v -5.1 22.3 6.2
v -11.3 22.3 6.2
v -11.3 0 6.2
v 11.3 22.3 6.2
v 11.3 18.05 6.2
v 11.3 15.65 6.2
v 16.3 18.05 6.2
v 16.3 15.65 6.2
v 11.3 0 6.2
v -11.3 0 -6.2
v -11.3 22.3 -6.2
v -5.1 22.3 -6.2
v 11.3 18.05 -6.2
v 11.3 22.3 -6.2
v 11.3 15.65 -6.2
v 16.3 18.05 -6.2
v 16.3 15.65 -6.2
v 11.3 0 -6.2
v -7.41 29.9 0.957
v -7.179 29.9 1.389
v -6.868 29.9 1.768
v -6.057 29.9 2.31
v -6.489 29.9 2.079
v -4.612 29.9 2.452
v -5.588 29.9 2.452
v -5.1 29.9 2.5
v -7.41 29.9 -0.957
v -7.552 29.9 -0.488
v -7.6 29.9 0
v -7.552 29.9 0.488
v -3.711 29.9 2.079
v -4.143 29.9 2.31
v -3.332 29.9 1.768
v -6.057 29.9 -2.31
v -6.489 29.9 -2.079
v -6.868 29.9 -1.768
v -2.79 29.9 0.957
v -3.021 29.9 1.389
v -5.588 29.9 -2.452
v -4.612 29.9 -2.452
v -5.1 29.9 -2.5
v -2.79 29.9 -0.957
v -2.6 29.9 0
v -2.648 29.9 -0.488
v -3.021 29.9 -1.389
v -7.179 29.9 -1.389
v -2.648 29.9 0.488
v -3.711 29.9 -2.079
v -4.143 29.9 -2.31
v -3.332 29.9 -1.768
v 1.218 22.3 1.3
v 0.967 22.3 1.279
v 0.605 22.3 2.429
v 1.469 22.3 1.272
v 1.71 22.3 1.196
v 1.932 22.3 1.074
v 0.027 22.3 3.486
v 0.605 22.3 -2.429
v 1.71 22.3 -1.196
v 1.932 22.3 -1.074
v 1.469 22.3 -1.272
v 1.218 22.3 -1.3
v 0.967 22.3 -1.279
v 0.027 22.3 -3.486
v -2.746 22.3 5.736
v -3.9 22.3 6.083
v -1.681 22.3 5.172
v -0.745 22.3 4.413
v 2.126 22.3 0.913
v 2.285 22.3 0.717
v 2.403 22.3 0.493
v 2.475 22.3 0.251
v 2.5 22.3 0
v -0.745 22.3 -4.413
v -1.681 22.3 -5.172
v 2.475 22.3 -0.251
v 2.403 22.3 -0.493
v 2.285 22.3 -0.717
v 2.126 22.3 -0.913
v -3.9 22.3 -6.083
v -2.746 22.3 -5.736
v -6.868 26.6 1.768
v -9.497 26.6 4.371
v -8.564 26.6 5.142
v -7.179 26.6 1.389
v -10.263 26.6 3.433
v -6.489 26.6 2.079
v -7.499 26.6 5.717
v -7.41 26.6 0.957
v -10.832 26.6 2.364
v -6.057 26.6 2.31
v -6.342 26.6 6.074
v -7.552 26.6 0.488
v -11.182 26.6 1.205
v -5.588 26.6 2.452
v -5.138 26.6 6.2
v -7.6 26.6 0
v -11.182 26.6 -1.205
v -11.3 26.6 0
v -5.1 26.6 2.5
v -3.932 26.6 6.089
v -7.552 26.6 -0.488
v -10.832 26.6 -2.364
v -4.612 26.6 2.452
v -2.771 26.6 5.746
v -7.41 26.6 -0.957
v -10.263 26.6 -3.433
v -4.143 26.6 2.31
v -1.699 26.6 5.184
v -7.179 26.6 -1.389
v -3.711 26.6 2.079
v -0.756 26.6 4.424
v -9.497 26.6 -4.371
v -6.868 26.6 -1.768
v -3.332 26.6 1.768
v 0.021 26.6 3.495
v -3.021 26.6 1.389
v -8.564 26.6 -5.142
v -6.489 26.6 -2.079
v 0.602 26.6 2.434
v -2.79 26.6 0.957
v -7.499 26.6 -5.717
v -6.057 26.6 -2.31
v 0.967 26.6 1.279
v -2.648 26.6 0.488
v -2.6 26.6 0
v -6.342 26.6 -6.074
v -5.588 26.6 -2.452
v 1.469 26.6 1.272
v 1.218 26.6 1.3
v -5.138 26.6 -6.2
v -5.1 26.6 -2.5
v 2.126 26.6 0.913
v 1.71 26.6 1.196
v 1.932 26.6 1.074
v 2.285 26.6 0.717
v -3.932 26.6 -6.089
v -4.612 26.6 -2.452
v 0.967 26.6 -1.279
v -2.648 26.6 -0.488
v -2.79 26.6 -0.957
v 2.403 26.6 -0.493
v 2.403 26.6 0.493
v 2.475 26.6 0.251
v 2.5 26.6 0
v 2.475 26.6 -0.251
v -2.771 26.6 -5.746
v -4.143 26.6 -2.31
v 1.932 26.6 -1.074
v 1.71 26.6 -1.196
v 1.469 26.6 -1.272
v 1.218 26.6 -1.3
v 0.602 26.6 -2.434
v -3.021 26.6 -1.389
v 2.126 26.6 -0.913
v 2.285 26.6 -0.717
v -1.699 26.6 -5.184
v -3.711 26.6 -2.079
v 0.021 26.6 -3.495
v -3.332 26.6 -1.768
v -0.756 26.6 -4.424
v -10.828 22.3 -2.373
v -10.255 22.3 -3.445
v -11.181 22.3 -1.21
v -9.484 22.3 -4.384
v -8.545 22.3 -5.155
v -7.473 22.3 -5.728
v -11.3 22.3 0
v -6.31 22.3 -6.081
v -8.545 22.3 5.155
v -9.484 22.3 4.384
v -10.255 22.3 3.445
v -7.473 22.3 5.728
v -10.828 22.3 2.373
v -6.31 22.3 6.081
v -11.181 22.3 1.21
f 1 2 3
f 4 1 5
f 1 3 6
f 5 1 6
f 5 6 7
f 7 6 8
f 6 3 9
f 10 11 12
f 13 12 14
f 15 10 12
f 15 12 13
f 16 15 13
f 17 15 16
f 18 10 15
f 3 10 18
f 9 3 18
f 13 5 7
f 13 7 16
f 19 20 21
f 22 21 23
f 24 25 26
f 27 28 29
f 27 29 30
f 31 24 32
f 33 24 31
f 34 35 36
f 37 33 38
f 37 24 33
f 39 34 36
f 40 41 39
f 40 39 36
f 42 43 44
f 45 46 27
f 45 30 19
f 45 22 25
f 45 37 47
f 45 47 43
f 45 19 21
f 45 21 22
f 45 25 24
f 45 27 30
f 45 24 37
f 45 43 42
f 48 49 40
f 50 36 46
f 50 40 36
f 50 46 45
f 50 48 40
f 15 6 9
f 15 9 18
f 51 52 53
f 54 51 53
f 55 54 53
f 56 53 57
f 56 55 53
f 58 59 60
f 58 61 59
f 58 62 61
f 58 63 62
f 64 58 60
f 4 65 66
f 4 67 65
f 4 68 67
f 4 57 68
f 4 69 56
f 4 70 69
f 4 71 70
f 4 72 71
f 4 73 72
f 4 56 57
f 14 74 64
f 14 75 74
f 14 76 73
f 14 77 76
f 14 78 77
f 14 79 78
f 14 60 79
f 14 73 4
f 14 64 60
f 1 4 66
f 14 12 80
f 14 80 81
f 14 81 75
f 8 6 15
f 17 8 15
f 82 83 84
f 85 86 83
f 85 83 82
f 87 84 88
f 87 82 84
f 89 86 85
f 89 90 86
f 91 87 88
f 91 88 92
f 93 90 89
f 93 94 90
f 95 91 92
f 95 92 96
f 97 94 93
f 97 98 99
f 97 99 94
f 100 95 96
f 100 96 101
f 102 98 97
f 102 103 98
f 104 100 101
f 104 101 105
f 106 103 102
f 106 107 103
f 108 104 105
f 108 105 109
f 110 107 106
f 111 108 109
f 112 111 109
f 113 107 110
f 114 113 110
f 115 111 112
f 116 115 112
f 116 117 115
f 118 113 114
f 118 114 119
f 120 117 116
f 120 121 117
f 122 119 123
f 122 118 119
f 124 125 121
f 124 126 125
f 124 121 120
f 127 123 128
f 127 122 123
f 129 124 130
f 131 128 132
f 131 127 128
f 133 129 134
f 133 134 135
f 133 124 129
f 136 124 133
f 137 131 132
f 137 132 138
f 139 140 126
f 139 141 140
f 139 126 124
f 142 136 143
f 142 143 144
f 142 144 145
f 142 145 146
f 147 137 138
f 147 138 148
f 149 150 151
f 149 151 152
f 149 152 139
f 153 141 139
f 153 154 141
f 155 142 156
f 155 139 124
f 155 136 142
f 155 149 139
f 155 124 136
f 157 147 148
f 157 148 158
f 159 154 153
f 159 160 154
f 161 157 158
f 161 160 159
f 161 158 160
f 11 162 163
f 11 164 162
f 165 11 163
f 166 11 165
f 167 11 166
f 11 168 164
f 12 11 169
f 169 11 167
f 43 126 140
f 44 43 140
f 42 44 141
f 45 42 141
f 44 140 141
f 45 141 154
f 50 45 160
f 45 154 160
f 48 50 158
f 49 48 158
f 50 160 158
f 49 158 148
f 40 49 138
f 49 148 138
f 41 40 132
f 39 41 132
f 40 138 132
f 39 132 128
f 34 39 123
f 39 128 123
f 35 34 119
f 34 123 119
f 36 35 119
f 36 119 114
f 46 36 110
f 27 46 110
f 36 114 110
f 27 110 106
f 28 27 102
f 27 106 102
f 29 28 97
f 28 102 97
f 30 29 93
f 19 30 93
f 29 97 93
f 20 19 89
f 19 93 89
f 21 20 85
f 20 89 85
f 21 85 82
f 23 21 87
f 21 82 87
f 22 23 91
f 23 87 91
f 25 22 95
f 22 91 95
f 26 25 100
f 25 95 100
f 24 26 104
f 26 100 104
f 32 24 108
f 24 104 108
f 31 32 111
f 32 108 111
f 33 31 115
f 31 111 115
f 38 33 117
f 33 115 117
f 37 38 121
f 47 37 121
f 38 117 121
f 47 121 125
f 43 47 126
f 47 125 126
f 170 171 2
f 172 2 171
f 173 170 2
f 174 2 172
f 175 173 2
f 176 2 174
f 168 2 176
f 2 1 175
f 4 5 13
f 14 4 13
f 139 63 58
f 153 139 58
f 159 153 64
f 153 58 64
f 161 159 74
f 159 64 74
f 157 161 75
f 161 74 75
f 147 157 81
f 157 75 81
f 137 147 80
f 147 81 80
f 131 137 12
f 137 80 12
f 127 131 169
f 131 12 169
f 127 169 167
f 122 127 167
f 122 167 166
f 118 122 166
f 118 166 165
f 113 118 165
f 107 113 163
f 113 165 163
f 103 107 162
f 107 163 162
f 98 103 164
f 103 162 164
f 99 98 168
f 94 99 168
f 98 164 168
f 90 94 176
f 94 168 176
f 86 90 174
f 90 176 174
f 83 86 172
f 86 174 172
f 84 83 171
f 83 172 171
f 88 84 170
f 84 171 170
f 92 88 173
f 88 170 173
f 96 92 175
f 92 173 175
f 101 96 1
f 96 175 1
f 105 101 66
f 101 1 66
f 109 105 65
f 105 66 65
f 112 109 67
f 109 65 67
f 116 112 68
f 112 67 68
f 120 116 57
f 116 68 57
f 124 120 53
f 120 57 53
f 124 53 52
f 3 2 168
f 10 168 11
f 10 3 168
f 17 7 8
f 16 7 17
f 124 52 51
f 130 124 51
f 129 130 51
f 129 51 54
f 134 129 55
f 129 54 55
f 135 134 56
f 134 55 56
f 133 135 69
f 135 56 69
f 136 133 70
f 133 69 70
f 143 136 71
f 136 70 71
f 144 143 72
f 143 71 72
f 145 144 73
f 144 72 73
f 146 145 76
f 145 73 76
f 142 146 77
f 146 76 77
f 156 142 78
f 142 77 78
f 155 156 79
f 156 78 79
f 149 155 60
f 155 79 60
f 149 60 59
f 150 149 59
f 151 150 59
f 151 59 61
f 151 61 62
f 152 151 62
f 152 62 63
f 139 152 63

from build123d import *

# Parameters (mm, degrees)
SKETCH1_W           = 22.6
SKETCH1_H           = 12.4
BOSS_EXTRUDE1_DEPTH = 22.3
SKETCH2_W           = 12.4
SKETCH2_H           = 2.4
BOSS_EXTRUDE2_DEPTH = 5
BOSS_EXTRUDE4_DEPTH = 4.3
SKETCH7_R           = 2.5
BOSS_EXTRUDE5_DEPTH = 3.3


with BuildPart() as part:
    # Sketch1 → Boss-Extrude1 (new body)
    with BuildSketch(Plane(origin=(0, 0, 0), x_dir=(1, 0, 0), z_dir=(0, 1, 0))):
        Rectangle(SKETCH1_W, SKETCH1_H)
    extrude(amount=BOSS_EXTRUDE1_DEPTH)

    # Sketch2 → Boss-Extrude2 (add)
    with BuildSketch(Plane(origin=(11.3, 0, 0), x_dir=(0, 0, -1), z_dir=(1, 0, 0))):
        with Locations((0, 16.85)):
            Rectangle(SKETCH2_W, SKETCH2_H)
    extrude(amount=BOSS_EXTRUDE2_DEPTH)

    # Sketch6 → Boss-Extrude4 (add)
    with BuildSketch(Plane(origin=(0, 22.3, 0), x_dir=(1, 0, 0), z_dir=(0, 1, 0))):
        with BuildLine():
            ThreePointArc((0.966666667, -1.278888406), (2.5, 0), (0.966666667, 1.278888406))
            ThreePointArc((0.966666667, 1.278888406), (-11.3, 0), (0.966666667, -1.278888406))
        make_face()
    extrude(amount=BOSS_EXTRUDE4_DEPTH)

    # Sketch7 → Boss-Extrude5 (add)
    with BuildSketch(Plane(origin=(0, 26.6, 0), x_dir=(1, 0, 0), z_dir=(0, 1, 0))):
        with Locations((-5.1, 0)):
            Circle(SKETCH7_R)
    extrude(amount=BOSS_EXTRUDE5_DEPTH)


solid = part.part
